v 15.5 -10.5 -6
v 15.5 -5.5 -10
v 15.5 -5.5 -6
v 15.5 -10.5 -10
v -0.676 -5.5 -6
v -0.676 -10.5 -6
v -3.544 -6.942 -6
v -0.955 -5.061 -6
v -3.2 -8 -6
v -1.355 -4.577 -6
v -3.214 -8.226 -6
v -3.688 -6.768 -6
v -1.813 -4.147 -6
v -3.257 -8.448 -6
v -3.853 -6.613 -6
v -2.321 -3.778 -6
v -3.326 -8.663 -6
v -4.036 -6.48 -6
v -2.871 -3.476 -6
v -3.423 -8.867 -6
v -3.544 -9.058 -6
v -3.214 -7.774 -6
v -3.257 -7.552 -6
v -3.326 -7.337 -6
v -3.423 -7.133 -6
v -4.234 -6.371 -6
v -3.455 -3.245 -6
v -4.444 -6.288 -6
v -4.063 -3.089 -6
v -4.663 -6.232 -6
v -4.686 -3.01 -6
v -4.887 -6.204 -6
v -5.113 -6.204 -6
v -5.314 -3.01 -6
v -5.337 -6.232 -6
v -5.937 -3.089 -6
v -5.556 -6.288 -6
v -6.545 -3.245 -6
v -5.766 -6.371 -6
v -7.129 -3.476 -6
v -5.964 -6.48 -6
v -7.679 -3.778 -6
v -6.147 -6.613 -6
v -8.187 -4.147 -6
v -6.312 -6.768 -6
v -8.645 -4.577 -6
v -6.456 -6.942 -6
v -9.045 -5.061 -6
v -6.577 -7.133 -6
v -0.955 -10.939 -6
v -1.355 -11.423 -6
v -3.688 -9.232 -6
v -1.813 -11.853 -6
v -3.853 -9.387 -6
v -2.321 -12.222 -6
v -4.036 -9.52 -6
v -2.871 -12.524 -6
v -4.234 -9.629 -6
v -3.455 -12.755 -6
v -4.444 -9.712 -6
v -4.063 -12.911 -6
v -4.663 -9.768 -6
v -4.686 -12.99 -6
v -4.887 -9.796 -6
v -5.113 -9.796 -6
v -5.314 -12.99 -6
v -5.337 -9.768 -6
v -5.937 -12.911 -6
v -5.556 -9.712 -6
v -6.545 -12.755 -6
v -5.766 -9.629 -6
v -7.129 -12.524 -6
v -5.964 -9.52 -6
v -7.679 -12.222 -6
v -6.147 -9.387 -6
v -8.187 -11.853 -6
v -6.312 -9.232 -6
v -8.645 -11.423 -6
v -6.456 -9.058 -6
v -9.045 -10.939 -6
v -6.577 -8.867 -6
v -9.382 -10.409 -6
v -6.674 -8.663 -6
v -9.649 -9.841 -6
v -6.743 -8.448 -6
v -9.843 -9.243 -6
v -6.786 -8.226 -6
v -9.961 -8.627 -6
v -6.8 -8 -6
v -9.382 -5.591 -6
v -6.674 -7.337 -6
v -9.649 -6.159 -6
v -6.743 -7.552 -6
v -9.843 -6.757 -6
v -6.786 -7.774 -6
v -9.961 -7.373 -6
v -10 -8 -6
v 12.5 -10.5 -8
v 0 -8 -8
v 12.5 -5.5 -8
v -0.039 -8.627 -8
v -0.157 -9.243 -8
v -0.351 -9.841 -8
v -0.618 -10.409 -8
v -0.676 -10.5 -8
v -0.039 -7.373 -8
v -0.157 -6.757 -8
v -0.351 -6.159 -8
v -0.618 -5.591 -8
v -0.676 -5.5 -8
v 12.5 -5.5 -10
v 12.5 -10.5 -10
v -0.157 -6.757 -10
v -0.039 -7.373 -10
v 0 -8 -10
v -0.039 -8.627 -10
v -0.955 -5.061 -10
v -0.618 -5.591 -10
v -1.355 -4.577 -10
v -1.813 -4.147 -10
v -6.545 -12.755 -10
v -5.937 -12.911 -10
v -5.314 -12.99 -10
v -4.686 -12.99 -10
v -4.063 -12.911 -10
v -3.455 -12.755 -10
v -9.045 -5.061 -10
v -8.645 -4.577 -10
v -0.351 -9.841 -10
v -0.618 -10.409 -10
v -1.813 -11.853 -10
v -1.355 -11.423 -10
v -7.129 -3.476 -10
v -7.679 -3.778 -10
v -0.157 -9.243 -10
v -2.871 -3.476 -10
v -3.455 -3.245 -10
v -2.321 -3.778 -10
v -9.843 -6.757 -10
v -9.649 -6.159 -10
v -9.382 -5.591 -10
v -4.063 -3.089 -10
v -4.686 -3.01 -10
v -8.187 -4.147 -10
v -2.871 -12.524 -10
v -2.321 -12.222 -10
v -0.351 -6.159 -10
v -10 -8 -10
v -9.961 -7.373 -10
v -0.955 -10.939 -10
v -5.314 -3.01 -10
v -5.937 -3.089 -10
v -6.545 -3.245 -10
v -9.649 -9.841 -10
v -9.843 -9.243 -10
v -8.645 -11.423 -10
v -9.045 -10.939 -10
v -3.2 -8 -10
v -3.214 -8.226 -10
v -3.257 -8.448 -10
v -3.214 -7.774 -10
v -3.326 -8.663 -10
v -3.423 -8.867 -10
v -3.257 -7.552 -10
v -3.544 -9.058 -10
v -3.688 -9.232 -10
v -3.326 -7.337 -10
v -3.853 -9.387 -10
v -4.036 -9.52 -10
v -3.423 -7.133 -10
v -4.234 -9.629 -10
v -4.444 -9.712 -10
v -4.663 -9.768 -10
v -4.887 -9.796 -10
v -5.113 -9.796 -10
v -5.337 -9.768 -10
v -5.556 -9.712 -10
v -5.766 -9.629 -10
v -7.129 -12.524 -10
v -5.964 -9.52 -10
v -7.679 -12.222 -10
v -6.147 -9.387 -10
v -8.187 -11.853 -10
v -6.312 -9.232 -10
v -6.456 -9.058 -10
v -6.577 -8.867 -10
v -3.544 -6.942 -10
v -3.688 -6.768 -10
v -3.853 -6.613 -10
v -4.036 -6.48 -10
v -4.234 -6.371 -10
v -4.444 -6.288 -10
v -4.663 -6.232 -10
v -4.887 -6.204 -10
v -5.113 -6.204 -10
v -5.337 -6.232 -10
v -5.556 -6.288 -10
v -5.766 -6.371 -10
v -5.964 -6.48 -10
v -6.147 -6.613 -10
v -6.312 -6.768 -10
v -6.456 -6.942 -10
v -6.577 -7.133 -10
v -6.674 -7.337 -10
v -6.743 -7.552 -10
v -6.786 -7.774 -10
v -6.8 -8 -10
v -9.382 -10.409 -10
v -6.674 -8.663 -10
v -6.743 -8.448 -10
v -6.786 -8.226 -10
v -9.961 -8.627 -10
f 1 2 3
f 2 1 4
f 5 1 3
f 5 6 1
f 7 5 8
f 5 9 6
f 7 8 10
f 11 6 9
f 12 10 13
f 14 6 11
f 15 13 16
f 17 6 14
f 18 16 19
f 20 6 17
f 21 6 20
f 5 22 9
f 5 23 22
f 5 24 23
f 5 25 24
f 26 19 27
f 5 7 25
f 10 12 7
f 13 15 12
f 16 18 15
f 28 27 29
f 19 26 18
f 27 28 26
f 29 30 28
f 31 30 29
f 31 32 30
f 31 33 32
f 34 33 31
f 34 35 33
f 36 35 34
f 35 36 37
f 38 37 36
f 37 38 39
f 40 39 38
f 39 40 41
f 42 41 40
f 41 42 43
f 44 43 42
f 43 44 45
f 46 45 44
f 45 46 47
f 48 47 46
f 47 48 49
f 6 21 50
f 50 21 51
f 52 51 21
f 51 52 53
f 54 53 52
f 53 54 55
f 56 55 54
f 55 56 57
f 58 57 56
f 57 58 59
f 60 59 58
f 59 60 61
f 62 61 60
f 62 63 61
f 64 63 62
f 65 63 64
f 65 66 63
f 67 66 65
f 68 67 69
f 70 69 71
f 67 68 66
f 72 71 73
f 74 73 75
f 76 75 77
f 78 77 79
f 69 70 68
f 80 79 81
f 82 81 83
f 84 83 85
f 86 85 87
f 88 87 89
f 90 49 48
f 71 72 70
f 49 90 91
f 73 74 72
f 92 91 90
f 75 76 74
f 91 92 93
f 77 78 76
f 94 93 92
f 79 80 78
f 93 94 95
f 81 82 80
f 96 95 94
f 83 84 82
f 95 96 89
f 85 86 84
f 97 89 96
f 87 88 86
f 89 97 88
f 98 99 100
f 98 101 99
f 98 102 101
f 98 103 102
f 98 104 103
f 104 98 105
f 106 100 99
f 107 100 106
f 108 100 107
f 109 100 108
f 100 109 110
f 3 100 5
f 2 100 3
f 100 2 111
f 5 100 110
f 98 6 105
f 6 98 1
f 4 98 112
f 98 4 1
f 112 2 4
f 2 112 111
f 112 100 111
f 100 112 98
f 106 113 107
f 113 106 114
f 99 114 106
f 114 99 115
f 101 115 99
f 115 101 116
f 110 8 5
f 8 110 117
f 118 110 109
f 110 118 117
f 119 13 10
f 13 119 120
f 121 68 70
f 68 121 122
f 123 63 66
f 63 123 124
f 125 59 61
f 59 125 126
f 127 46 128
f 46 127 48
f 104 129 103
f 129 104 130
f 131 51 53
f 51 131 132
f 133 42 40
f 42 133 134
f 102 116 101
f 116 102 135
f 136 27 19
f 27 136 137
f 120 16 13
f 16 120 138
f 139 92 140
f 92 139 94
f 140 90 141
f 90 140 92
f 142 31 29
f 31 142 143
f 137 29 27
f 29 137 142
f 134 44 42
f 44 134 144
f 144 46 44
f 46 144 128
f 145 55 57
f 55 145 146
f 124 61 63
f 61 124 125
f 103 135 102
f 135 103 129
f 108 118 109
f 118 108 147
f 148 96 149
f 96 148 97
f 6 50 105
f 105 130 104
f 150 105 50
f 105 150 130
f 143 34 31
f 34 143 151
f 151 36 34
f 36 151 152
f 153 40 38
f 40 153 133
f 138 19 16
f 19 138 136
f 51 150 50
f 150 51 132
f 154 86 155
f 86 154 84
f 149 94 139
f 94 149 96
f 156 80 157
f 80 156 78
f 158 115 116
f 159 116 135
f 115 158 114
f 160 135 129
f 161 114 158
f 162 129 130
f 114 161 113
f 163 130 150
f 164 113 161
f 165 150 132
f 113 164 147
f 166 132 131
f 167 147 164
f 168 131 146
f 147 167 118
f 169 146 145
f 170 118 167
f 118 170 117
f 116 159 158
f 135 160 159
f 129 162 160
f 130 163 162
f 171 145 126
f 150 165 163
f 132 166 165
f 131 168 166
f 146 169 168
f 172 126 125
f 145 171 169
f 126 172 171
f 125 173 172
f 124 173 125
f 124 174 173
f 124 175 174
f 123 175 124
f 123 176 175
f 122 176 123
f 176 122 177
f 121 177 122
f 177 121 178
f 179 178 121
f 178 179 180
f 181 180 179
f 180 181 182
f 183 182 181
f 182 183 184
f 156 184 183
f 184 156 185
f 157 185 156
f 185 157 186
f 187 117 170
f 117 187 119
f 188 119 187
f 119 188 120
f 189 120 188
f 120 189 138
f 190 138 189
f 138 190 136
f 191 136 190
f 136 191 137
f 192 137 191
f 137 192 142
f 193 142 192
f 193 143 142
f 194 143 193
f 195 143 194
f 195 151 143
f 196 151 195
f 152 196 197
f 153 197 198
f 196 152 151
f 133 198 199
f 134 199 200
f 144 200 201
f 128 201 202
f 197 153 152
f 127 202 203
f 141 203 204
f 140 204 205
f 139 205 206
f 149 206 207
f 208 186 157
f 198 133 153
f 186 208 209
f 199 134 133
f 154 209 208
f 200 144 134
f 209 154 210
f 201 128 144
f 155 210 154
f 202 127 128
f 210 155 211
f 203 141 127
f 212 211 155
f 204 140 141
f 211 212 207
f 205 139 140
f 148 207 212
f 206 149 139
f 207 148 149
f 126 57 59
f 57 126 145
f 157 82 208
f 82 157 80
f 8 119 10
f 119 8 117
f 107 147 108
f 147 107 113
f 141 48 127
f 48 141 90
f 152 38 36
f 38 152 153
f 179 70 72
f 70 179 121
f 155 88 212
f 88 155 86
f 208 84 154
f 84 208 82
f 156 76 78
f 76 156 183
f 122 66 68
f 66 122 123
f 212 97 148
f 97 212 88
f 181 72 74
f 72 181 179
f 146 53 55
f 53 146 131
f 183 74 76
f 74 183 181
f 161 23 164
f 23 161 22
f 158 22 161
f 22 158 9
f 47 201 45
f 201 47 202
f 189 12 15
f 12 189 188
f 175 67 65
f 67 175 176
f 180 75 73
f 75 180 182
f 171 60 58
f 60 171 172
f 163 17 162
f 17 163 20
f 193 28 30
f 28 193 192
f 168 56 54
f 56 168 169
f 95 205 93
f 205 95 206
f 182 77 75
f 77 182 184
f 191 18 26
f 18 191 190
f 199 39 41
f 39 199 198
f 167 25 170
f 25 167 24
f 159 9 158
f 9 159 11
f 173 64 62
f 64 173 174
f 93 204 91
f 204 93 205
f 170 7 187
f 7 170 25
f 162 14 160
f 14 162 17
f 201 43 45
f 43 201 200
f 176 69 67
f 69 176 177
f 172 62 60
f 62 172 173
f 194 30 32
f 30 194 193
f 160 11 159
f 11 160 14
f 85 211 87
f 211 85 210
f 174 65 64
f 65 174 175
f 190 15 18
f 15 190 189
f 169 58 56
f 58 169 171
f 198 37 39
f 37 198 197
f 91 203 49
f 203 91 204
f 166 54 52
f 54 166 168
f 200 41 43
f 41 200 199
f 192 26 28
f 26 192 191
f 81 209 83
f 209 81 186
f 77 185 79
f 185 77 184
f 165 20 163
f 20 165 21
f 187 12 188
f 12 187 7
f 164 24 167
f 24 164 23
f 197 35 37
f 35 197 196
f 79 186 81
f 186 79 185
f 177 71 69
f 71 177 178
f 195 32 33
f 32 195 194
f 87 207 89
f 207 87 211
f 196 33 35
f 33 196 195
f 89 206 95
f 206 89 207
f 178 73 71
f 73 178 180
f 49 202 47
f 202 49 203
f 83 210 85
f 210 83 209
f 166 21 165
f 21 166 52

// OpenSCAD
$fn = 50;

h = 20;
w = 30;
l = 20;
thick = 2;

hole_h = 6;
hole_w = 11;


module top() {
  // top
  translate([w/8-2, -thick/2, -thick/2]) {
    difference() {
    //  translate([-10, 0, 0])
      cube([w/4*3, thick, h], center=true);
      translate([2.5, 0, 5]) {
        cube([hole_w, thick, hole_h], center=true);
      }
      translate([-2.5-5, 0, 6.5]) {
        rotate([90, 0, 0])
          cylinder(d=3.2, h=50, center=true);
      }
    }
  }
}

// bottom
module bottom() {
  translate([0, -l/2+2, -h/2]) {
    difference() {
      union() {
        translate([5, 0, 0]) {
          difference() {
            cube([w-l/2-2, l-6, thick], center=true);
            translate([10, -5, 0]) {
              rotate(45) {
                cube([30, 20, thick], center=true);
              }
            }
          }
        }
        // with hole to attach to HDD
        translate([-5, 0, 0]) {
          cylinder(r=l/2-2, h=thick, center=true);
        }
      }
      // for bolt
      translate([-5, 0, 0]) {
        cylinder(d=3.4, h=50, center=true);
      }
    }
  }
}

module wire_holder() {
  translate([0, -l/2+2, -h/2]) {
    difference() {
      union() {
        // with hole to attach to HDD
        translate([-5, 0, thick]) {
          cylinder(r=5, h=thick*2, center=true);
          translate([12, 0, thick/2]) {
            cube([17, 5, thick], center=true);
            translate([7, 0, -thick]) {
              cube([thick+1, 5, thick], center=true);
            }
          }
        }
      }
      // for bolt
      translate([-5, 0, 0]) {
        cylinder(d=3.6, h=50, center=true);
      }
    }
  }
}


//top();
//bottom();
wire_holder();
